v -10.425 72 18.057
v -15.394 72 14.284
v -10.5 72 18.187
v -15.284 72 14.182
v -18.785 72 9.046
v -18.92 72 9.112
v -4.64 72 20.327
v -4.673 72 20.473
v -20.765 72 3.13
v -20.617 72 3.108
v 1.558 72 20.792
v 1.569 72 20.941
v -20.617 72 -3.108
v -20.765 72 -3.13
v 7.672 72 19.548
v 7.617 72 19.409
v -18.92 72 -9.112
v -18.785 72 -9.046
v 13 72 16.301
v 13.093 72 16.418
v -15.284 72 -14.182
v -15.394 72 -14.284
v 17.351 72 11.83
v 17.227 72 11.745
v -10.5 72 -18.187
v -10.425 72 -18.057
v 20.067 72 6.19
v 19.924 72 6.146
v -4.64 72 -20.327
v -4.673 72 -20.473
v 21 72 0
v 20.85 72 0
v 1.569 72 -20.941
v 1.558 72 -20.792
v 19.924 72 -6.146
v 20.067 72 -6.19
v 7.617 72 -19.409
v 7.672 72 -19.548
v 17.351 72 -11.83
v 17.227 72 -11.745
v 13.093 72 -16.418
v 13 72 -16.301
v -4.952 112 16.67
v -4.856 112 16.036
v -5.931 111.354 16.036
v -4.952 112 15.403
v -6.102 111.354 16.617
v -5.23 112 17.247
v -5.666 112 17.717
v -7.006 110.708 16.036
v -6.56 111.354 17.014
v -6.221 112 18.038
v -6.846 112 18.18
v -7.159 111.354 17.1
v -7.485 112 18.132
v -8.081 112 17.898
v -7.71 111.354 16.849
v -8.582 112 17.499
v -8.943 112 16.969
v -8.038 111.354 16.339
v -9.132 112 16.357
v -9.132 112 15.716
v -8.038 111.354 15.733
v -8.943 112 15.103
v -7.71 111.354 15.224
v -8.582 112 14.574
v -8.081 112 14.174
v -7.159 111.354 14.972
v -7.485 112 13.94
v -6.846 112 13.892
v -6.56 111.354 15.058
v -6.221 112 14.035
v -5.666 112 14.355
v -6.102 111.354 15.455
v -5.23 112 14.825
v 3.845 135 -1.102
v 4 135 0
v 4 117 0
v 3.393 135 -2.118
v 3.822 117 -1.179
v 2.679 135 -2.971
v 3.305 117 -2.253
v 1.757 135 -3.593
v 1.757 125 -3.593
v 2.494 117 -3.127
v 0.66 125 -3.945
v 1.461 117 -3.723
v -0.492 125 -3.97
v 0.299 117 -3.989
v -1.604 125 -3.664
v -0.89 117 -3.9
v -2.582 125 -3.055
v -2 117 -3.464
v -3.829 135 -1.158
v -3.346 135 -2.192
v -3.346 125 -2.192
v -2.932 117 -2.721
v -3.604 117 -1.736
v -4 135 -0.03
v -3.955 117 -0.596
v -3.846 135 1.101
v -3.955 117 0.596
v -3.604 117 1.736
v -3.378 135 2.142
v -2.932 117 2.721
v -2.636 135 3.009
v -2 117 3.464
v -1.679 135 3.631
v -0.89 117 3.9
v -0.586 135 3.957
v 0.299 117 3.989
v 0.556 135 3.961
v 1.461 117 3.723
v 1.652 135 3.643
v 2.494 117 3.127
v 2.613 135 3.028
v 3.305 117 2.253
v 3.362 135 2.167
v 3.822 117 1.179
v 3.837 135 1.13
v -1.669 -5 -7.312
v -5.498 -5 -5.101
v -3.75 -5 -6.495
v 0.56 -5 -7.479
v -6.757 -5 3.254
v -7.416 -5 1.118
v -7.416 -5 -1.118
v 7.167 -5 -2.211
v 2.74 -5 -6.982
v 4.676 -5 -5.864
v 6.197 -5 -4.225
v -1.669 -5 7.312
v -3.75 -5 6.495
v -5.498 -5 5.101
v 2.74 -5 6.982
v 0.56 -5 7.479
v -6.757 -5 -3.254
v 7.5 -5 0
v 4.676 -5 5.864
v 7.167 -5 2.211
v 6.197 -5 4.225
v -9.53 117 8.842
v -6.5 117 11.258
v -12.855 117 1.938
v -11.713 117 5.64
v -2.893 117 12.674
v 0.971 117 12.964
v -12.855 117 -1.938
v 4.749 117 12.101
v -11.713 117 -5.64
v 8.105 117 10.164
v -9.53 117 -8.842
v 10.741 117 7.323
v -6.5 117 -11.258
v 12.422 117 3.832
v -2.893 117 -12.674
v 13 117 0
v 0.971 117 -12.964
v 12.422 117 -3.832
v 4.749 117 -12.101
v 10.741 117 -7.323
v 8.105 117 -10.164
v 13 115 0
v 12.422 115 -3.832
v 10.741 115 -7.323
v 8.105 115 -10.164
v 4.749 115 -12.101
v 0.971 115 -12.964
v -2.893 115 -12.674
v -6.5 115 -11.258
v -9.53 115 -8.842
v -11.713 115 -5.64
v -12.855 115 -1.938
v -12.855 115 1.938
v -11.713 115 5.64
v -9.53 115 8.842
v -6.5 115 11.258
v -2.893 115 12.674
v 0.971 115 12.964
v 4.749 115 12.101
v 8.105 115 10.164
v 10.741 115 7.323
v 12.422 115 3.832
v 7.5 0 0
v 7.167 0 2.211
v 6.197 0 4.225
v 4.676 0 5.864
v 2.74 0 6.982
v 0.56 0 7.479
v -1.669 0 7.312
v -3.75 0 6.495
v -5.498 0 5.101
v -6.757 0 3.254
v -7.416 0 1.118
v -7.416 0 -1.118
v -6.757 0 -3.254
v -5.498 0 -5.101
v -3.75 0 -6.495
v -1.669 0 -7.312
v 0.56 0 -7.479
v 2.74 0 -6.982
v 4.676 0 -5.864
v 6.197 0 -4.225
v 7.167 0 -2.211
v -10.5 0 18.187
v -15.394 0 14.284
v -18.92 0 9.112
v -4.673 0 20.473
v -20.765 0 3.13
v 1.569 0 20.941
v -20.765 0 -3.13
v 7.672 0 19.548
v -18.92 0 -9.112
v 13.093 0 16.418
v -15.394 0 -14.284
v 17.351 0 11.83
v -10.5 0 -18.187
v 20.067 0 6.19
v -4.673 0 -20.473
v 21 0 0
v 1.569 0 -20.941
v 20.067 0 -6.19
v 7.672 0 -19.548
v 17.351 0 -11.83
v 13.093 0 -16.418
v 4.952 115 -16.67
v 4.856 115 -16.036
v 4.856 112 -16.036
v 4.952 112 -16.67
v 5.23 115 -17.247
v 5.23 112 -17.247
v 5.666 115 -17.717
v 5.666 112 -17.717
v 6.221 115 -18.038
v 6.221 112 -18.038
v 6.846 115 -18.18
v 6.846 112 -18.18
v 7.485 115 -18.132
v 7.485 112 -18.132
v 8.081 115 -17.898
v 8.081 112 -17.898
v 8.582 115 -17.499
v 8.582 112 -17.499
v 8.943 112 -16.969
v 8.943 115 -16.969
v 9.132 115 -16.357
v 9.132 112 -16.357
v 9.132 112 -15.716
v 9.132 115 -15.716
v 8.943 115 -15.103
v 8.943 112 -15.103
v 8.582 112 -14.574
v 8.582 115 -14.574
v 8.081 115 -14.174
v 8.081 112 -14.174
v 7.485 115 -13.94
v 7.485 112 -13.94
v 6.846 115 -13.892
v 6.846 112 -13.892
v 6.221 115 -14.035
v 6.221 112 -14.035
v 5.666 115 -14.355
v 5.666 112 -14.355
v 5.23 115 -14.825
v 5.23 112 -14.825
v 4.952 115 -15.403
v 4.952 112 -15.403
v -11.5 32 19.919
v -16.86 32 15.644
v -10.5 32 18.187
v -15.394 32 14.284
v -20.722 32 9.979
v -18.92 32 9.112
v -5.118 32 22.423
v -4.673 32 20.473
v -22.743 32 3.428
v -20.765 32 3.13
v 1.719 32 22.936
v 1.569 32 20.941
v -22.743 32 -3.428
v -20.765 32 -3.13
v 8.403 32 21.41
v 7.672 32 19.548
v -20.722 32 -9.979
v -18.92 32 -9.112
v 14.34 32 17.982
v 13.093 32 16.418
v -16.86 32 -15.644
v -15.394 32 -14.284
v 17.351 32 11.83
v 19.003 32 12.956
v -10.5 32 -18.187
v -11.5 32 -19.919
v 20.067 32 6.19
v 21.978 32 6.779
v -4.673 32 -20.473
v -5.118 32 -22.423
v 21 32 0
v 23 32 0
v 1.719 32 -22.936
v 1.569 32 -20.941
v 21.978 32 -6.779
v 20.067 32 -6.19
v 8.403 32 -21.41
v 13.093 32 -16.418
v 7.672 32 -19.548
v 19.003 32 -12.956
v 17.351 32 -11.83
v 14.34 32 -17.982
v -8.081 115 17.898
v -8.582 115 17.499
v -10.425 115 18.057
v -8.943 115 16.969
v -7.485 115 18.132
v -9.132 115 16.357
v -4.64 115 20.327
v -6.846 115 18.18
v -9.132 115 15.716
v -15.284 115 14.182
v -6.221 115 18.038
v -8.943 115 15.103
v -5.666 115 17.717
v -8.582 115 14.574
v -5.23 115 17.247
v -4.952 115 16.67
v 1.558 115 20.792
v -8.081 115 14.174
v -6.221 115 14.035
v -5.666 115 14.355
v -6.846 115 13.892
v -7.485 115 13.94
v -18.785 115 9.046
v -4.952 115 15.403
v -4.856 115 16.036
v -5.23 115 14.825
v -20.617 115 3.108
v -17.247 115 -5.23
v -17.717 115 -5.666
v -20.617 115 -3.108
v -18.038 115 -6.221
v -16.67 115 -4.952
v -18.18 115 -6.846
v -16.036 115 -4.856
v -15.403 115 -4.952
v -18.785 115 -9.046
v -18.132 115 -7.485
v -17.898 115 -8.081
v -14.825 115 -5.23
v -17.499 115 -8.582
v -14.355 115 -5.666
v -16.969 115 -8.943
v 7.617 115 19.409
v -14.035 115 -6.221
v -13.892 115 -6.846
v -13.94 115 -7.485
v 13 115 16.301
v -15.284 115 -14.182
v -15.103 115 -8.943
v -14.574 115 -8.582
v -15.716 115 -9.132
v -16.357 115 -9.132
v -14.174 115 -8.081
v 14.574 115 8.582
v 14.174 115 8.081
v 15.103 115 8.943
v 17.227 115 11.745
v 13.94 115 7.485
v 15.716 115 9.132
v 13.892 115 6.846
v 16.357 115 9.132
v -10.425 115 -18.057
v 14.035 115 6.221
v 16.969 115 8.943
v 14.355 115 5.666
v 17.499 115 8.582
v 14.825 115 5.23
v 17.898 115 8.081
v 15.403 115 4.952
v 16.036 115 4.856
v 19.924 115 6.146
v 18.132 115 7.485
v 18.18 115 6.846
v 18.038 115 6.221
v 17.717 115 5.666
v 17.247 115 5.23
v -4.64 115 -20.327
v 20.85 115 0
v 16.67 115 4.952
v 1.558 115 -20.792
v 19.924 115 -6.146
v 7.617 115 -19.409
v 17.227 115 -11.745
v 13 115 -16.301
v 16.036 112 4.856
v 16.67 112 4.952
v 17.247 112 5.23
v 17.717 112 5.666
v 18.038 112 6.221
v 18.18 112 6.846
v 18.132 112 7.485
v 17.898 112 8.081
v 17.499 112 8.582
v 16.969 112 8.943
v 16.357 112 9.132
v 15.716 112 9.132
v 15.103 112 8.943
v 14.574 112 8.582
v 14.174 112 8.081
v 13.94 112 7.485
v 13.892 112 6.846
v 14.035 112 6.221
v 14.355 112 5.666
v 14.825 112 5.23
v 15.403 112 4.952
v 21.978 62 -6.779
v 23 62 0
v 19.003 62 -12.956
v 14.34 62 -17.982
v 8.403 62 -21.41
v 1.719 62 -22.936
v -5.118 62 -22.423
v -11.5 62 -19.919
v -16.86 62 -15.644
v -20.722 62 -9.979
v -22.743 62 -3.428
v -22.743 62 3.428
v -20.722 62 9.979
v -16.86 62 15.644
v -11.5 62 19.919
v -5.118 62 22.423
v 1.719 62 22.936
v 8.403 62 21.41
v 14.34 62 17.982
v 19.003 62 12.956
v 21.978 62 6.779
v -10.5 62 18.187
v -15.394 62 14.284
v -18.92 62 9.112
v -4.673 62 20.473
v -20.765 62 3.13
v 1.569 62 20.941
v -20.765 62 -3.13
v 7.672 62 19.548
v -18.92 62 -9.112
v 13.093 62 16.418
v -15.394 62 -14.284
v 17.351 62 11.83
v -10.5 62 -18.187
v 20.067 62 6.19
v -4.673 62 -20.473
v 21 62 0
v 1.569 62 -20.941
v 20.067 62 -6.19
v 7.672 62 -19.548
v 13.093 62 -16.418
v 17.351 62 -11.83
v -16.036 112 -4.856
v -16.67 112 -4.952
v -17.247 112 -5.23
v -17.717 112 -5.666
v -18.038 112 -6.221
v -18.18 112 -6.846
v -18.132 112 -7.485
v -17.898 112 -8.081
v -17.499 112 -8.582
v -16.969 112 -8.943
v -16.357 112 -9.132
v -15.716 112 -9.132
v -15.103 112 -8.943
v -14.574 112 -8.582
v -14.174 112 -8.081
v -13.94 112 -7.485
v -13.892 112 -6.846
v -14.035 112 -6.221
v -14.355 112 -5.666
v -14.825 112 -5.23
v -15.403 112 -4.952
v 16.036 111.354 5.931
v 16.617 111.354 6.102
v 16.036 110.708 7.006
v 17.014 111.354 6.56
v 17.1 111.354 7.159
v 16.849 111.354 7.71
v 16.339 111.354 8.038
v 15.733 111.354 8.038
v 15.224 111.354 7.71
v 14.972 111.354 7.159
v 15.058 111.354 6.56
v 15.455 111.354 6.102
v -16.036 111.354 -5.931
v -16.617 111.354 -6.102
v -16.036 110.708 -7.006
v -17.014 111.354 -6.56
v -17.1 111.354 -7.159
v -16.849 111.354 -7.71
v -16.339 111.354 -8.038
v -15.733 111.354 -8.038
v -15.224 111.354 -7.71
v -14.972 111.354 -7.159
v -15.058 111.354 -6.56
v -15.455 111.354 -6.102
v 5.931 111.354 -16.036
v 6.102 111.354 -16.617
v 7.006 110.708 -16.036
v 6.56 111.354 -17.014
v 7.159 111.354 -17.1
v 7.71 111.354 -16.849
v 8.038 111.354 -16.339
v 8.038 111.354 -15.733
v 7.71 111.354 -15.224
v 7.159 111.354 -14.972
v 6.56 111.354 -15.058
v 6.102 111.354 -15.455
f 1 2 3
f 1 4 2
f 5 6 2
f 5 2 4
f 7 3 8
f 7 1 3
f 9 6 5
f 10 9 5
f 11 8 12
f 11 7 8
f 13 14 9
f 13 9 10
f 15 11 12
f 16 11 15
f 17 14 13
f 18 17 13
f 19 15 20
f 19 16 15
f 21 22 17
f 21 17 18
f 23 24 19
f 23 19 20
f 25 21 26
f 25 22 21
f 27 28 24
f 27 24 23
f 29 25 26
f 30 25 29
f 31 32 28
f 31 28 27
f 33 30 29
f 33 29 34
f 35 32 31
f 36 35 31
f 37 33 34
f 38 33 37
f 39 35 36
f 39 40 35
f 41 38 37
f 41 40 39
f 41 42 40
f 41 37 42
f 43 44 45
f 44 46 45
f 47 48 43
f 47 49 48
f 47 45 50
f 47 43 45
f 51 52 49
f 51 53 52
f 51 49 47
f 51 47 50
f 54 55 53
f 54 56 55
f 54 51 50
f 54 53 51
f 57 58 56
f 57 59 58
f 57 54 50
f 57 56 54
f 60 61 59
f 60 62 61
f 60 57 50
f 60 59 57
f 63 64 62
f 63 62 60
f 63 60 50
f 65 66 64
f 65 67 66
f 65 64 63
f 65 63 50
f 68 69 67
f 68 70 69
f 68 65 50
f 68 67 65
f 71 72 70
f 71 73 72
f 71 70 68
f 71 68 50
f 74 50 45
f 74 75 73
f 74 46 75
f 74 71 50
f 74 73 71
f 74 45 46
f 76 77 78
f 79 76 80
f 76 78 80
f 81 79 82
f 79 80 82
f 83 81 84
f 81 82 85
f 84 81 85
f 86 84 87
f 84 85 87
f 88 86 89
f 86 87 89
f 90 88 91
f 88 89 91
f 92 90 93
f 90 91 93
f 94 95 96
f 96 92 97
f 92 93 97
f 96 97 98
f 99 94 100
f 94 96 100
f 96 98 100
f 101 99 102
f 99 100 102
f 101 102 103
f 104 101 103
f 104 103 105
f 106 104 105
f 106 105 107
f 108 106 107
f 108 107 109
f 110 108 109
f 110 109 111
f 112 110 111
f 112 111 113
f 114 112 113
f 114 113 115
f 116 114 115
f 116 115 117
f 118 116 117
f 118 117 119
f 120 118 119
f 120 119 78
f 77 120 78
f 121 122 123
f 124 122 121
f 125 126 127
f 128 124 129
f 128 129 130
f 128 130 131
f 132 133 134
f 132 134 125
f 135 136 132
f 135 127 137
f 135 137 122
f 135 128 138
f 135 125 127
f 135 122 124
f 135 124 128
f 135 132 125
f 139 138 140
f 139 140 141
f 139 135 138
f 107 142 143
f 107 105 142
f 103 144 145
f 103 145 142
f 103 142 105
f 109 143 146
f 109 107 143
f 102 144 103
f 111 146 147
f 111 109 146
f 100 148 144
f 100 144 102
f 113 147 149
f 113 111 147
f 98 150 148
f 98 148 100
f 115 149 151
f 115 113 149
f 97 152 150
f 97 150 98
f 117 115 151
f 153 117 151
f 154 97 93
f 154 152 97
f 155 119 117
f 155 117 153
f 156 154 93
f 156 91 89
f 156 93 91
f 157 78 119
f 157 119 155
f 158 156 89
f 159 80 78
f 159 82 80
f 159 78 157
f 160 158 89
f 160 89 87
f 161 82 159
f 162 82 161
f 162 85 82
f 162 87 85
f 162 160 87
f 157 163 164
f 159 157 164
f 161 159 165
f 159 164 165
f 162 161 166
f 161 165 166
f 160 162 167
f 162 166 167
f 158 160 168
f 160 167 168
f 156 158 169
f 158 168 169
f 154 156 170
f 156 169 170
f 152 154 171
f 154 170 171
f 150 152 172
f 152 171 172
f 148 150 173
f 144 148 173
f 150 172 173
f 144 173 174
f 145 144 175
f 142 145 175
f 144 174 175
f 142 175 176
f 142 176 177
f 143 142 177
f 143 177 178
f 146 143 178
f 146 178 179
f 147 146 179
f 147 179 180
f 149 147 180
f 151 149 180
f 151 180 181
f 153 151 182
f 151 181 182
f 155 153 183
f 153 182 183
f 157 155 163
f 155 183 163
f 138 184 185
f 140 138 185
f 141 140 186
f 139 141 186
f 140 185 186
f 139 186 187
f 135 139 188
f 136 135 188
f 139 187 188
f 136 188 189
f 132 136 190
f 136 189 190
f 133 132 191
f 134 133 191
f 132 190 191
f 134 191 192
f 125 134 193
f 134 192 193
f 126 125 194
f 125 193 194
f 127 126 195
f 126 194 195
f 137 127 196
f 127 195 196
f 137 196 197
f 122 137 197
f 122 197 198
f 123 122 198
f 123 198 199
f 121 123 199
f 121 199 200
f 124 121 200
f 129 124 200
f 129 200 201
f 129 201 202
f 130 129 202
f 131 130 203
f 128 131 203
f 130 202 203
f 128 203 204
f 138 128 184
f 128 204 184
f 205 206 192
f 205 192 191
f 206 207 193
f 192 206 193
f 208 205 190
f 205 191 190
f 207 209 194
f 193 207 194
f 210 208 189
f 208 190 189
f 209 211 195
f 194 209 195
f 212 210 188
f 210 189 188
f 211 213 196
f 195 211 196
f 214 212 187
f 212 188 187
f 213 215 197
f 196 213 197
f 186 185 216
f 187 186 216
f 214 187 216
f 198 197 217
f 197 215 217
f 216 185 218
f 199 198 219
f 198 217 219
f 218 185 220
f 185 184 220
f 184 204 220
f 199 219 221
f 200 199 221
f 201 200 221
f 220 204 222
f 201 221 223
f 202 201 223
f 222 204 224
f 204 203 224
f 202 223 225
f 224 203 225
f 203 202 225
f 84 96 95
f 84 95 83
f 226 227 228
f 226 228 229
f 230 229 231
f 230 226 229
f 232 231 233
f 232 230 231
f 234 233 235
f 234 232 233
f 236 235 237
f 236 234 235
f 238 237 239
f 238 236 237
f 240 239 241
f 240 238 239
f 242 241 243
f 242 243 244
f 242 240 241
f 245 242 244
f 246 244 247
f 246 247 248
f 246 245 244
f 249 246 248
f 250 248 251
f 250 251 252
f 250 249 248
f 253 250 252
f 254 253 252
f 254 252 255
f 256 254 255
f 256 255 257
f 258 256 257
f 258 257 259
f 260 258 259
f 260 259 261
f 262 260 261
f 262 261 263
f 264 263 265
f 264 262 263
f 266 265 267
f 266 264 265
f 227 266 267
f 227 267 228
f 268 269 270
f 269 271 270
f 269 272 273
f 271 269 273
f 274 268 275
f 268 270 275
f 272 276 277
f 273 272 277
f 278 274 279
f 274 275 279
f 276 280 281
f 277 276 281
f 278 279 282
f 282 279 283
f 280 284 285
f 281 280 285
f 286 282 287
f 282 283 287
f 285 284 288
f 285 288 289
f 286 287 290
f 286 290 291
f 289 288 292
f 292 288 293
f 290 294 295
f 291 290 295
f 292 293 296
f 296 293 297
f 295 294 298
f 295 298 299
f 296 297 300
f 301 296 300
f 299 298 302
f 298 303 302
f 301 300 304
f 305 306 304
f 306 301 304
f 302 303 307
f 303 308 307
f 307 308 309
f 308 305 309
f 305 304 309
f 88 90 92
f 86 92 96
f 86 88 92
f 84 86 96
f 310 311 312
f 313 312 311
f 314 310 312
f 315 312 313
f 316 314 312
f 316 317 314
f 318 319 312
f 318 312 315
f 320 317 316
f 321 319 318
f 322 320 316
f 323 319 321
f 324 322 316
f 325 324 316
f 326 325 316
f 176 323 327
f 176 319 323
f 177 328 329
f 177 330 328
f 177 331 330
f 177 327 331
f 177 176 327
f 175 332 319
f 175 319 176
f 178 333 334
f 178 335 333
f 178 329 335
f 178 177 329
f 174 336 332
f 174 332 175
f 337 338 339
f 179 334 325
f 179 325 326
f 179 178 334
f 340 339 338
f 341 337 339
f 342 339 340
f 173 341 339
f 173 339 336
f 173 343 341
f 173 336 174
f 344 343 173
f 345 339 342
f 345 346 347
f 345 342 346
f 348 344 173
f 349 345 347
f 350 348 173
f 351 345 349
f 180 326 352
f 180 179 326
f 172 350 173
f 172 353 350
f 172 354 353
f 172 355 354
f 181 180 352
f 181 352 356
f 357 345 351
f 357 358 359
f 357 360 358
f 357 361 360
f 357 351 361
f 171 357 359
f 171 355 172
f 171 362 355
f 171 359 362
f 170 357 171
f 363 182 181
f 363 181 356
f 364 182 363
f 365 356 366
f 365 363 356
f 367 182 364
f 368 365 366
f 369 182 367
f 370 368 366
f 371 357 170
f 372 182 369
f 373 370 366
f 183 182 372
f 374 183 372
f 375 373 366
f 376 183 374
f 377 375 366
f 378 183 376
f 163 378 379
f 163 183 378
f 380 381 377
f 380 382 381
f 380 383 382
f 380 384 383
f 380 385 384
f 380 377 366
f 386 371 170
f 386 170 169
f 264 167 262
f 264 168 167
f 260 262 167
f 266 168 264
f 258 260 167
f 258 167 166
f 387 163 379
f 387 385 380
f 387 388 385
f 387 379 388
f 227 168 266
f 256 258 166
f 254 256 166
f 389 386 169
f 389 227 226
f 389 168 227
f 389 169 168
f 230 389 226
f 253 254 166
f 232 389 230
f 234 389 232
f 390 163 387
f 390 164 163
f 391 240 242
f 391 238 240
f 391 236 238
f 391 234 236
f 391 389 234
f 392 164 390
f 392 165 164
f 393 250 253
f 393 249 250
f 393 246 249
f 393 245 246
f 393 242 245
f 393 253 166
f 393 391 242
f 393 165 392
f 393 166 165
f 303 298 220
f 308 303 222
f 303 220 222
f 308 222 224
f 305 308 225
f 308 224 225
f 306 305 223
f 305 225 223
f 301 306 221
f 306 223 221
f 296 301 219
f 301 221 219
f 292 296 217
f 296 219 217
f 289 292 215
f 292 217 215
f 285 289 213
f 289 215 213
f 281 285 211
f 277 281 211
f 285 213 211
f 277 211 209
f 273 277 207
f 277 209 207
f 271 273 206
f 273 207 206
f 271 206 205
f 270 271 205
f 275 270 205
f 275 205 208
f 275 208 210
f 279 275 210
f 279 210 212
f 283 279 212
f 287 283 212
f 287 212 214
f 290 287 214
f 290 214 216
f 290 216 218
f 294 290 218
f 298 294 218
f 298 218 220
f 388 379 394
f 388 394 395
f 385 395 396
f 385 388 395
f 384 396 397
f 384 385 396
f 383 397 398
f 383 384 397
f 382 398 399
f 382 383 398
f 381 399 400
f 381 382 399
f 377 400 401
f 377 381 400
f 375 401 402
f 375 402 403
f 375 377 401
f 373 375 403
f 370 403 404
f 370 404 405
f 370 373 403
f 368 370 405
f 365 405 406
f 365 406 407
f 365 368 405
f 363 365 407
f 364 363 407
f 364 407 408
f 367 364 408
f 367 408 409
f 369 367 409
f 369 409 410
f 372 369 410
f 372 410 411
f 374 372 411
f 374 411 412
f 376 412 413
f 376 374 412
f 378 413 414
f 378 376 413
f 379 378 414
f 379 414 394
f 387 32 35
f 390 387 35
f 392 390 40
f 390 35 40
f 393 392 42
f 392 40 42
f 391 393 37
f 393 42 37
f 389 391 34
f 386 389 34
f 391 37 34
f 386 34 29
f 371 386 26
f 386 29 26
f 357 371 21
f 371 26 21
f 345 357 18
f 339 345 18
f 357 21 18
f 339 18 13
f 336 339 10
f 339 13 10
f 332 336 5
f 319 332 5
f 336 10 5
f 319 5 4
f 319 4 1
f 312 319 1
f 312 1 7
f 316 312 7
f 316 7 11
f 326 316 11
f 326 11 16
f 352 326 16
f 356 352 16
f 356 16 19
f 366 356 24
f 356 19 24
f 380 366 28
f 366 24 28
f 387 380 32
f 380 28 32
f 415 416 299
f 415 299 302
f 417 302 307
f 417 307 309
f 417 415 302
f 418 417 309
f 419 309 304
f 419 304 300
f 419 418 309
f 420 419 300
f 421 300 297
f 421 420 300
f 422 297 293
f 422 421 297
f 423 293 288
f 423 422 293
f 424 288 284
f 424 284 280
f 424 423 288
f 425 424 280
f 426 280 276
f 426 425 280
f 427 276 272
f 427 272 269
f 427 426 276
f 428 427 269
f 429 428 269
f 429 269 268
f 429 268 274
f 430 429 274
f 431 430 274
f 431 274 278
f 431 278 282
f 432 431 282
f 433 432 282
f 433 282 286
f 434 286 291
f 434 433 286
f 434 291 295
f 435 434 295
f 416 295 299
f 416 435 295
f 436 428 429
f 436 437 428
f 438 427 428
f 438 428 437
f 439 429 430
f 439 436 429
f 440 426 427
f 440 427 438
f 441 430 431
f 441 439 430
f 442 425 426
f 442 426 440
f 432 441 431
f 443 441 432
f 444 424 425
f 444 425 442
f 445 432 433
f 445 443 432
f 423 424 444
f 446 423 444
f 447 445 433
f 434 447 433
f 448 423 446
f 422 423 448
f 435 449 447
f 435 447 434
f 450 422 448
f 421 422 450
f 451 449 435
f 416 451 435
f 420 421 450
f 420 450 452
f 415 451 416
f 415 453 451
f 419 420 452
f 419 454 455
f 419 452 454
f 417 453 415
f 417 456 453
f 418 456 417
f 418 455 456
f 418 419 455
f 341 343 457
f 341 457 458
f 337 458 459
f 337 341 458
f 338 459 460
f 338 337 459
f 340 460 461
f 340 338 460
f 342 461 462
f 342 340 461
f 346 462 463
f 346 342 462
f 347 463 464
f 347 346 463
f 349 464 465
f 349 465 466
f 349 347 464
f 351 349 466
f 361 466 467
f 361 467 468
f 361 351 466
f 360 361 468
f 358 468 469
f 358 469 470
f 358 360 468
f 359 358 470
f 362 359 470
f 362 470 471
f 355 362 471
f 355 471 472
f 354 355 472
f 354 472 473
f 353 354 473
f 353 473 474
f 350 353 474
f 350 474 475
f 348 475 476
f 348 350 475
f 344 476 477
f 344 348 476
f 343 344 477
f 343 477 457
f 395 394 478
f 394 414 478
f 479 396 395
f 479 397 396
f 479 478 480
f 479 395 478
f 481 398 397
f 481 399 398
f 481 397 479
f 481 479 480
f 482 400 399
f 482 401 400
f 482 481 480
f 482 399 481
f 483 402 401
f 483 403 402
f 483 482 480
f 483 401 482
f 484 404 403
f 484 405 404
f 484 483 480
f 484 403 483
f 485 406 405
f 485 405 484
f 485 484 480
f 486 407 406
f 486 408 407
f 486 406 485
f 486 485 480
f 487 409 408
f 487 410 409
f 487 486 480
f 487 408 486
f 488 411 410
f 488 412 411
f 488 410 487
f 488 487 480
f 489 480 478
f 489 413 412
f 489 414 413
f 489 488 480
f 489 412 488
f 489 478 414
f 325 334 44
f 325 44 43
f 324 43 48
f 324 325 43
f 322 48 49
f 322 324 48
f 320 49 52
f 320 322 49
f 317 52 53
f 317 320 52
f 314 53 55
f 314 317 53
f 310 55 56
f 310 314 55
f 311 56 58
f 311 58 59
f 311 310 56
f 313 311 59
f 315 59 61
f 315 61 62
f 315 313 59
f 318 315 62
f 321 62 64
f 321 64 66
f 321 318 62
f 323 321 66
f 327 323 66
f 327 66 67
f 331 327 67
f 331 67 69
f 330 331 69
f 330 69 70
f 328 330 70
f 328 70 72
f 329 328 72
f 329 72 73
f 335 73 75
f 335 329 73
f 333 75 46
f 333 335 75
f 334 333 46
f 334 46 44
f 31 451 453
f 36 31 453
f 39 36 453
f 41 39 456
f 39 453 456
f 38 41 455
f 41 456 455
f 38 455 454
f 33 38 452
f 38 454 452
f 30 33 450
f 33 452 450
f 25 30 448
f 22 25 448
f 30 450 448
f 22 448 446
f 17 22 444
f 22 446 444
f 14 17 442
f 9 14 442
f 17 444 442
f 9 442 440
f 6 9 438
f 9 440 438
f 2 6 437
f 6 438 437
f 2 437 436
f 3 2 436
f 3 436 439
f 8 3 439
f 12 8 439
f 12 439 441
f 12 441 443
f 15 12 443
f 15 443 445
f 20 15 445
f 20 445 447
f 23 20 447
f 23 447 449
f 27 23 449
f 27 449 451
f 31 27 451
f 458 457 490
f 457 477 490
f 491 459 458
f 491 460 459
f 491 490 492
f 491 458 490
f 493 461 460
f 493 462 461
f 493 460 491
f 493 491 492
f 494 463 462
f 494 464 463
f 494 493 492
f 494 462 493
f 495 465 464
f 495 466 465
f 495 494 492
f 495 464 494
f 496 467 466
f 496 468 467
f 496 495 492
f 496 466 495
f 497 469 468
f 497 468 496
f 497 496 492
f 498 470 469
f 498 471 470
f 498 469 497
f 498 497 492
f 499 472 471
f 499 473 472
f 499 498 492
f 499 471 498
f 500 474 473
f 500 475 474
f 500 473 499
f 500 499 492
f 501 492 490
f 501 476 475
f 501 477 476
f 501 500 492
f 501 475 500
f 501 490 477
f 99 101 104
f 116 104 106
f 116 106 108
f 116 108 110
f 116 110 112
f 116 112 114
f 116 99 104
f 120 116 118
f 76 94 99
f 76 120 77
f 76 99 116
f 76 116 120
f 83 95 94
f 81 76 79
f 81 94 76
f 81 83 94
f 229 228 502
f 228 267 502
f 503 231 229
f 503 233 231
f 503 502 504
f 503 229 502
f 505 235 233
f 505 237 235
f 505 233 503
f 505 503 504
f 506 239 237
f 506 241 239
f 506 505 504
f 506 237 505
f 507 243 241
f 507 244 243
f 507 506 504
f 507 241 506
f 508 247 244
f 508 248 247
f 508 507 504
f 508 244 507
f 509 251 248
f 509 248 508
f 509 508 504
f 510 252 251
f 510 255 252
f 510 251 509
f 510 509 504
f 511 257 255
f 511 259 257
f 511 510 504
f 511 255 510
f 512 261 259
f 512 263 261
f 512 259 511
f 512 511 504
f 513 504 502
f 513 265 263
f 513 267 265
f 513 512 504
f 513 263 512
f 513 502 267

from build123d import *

# Parameters (mm, degrees)
SKETCH1_R           = 21
BOSS_EXTRUDE1_DEPTH = 72
SKETCH3_R           = 23
SKETCH3_R_2         = 21
BOSS_EXTRUDE2_DEPTH = 30
SKETCH4_R           = 20.85
BOSS_EXTRUDE3_DEPTH = 43
SKETCH5_R           = 13
BOSS_EXTRUDE4_DEPTH = 2
SKETCH6_R           = 4
BOSS_EXTRUDE5_DEPTH = 18
SKETCH8_R           = 7.5
BOSS_EXTRUDE6_DEPTH = 5
CIRPATTERN1_COUNT   = 4
CUT_EXTRUDE1_DEPTH  = 10


with BuildPart() as part:
    # Sketch1 → Boss-Extrude1 (new body)
    with BuildSketch(Plane(origin=(0, 0, 0), x_dir=(1, 0, 0), z_dir=(0, 1, 0))):
        Circle(SKETCH1_R)
    extrude(amount=BOSS_EXTRUDE1_DEPTH)

    # Sketch3 → Boss-Extrude2 (add)
    with BuildSketch(Plane(origin=(0, 62, 0), x_dir=(1, 0, 0), z_dir=(0, 1, 0))):
        Circle(SKETCH3_R)
        Circle(SKETCH3_R_2, mode=Mode.SUBTRACT)
    extrude(amount=-BOSS_EXTRUDE2_DEPTH)

    # Sketch4 → Boss-Extrude3 (add)
    with BuildSketch(Plane(origin=(0, 72, 0), x_dir=(1, 0, 0), z_dir=(0, 1, 0))):
        Circle(SKETCH4_R)
    extrude(amount=BOSS_EXTRUDE3_DEPTH)

    # Sketch5 → Boss-Extrude4 (add)
    with BuildSketch(Plane(origin=(0, 115, 0), x_dir=(1, 0, 0), z_dir=(0, 1, 0))):
        Circle(SKETCH5_R)
    extrude(amount=BOSS_EXTRUDE4_DEPTH)

    # Sketch6 → Boss-Extrude5 (add)
    with BuildSketch(Plane(origin=(0, 117, 0), x_dir=(1, 0, 0), z_dir=(0, 1, 0))):
        Circle(SKETCH6_R)
    extrude(amount=BOSS_EXTRUDE5_DEPTH)

    # Sketch8 → Boss-Extrude6 (add)
    with BuildSketch(Plane.XZ):
        Circle(SKETCH8_R)
    extrude(amount=BOSS_EXTRUDE6_DEPTH)

    # Sketch14 → CSK for M4 Flat Head Machine Screw1 (revolve, cut)
    with BuildSketch(Plane(origin=(-16.036289765, 117, -7.00624083), x_dir=(0, 0, 1), z_dir=(1, 0, 0))):
        Polygon((0, 0), (0, 6.291850331), (2.15, 5), (2.15, 0.6), (2.75, 0), align=None)
    csk_for_m4_flat_head_machine_screw1 = revolve(axis=Axis((-16.036289765, 123.35, -7.00624083), (0, -1, 0)), mode=Mode.SUBTRACT)

    # CirPattern1: CSK for M4 Flat Head Machine Screw1 ×4 about axis
    cirpattern1_axis = Axis((0, 0, 0), (0, 1, 0))
    for i in range(1, CIRPATTERN1_COUNT):
        add(csk_for_m4_flat_head_machine_screw1.rotate(cirpattern1_axis, i * 360 / CIRPATTERN1_COUNT), mode=Mode.SUBTRACT)

    # Sketch17 → Cut-Extrude1 (cut)
    with BuildSketch(Plane(origin=(0, 135, 0), x_dir=(1, 0, 0), z_dir=(0, 1, 0))):
        with BuildLine():
            Line((-3.345642255, 2.192413717), (1.757012768, 3.593453233))
            ThreePointArc((1.757012768, 3.593453233), (-1.059086325, 3.857244633), (-3.345642255, 2.192413717))
        make_face()
    extrude(amount=-CUT_EXTRUDE1_DEPTH, mode=Mode.SUBTRACT)


solid = part.part
